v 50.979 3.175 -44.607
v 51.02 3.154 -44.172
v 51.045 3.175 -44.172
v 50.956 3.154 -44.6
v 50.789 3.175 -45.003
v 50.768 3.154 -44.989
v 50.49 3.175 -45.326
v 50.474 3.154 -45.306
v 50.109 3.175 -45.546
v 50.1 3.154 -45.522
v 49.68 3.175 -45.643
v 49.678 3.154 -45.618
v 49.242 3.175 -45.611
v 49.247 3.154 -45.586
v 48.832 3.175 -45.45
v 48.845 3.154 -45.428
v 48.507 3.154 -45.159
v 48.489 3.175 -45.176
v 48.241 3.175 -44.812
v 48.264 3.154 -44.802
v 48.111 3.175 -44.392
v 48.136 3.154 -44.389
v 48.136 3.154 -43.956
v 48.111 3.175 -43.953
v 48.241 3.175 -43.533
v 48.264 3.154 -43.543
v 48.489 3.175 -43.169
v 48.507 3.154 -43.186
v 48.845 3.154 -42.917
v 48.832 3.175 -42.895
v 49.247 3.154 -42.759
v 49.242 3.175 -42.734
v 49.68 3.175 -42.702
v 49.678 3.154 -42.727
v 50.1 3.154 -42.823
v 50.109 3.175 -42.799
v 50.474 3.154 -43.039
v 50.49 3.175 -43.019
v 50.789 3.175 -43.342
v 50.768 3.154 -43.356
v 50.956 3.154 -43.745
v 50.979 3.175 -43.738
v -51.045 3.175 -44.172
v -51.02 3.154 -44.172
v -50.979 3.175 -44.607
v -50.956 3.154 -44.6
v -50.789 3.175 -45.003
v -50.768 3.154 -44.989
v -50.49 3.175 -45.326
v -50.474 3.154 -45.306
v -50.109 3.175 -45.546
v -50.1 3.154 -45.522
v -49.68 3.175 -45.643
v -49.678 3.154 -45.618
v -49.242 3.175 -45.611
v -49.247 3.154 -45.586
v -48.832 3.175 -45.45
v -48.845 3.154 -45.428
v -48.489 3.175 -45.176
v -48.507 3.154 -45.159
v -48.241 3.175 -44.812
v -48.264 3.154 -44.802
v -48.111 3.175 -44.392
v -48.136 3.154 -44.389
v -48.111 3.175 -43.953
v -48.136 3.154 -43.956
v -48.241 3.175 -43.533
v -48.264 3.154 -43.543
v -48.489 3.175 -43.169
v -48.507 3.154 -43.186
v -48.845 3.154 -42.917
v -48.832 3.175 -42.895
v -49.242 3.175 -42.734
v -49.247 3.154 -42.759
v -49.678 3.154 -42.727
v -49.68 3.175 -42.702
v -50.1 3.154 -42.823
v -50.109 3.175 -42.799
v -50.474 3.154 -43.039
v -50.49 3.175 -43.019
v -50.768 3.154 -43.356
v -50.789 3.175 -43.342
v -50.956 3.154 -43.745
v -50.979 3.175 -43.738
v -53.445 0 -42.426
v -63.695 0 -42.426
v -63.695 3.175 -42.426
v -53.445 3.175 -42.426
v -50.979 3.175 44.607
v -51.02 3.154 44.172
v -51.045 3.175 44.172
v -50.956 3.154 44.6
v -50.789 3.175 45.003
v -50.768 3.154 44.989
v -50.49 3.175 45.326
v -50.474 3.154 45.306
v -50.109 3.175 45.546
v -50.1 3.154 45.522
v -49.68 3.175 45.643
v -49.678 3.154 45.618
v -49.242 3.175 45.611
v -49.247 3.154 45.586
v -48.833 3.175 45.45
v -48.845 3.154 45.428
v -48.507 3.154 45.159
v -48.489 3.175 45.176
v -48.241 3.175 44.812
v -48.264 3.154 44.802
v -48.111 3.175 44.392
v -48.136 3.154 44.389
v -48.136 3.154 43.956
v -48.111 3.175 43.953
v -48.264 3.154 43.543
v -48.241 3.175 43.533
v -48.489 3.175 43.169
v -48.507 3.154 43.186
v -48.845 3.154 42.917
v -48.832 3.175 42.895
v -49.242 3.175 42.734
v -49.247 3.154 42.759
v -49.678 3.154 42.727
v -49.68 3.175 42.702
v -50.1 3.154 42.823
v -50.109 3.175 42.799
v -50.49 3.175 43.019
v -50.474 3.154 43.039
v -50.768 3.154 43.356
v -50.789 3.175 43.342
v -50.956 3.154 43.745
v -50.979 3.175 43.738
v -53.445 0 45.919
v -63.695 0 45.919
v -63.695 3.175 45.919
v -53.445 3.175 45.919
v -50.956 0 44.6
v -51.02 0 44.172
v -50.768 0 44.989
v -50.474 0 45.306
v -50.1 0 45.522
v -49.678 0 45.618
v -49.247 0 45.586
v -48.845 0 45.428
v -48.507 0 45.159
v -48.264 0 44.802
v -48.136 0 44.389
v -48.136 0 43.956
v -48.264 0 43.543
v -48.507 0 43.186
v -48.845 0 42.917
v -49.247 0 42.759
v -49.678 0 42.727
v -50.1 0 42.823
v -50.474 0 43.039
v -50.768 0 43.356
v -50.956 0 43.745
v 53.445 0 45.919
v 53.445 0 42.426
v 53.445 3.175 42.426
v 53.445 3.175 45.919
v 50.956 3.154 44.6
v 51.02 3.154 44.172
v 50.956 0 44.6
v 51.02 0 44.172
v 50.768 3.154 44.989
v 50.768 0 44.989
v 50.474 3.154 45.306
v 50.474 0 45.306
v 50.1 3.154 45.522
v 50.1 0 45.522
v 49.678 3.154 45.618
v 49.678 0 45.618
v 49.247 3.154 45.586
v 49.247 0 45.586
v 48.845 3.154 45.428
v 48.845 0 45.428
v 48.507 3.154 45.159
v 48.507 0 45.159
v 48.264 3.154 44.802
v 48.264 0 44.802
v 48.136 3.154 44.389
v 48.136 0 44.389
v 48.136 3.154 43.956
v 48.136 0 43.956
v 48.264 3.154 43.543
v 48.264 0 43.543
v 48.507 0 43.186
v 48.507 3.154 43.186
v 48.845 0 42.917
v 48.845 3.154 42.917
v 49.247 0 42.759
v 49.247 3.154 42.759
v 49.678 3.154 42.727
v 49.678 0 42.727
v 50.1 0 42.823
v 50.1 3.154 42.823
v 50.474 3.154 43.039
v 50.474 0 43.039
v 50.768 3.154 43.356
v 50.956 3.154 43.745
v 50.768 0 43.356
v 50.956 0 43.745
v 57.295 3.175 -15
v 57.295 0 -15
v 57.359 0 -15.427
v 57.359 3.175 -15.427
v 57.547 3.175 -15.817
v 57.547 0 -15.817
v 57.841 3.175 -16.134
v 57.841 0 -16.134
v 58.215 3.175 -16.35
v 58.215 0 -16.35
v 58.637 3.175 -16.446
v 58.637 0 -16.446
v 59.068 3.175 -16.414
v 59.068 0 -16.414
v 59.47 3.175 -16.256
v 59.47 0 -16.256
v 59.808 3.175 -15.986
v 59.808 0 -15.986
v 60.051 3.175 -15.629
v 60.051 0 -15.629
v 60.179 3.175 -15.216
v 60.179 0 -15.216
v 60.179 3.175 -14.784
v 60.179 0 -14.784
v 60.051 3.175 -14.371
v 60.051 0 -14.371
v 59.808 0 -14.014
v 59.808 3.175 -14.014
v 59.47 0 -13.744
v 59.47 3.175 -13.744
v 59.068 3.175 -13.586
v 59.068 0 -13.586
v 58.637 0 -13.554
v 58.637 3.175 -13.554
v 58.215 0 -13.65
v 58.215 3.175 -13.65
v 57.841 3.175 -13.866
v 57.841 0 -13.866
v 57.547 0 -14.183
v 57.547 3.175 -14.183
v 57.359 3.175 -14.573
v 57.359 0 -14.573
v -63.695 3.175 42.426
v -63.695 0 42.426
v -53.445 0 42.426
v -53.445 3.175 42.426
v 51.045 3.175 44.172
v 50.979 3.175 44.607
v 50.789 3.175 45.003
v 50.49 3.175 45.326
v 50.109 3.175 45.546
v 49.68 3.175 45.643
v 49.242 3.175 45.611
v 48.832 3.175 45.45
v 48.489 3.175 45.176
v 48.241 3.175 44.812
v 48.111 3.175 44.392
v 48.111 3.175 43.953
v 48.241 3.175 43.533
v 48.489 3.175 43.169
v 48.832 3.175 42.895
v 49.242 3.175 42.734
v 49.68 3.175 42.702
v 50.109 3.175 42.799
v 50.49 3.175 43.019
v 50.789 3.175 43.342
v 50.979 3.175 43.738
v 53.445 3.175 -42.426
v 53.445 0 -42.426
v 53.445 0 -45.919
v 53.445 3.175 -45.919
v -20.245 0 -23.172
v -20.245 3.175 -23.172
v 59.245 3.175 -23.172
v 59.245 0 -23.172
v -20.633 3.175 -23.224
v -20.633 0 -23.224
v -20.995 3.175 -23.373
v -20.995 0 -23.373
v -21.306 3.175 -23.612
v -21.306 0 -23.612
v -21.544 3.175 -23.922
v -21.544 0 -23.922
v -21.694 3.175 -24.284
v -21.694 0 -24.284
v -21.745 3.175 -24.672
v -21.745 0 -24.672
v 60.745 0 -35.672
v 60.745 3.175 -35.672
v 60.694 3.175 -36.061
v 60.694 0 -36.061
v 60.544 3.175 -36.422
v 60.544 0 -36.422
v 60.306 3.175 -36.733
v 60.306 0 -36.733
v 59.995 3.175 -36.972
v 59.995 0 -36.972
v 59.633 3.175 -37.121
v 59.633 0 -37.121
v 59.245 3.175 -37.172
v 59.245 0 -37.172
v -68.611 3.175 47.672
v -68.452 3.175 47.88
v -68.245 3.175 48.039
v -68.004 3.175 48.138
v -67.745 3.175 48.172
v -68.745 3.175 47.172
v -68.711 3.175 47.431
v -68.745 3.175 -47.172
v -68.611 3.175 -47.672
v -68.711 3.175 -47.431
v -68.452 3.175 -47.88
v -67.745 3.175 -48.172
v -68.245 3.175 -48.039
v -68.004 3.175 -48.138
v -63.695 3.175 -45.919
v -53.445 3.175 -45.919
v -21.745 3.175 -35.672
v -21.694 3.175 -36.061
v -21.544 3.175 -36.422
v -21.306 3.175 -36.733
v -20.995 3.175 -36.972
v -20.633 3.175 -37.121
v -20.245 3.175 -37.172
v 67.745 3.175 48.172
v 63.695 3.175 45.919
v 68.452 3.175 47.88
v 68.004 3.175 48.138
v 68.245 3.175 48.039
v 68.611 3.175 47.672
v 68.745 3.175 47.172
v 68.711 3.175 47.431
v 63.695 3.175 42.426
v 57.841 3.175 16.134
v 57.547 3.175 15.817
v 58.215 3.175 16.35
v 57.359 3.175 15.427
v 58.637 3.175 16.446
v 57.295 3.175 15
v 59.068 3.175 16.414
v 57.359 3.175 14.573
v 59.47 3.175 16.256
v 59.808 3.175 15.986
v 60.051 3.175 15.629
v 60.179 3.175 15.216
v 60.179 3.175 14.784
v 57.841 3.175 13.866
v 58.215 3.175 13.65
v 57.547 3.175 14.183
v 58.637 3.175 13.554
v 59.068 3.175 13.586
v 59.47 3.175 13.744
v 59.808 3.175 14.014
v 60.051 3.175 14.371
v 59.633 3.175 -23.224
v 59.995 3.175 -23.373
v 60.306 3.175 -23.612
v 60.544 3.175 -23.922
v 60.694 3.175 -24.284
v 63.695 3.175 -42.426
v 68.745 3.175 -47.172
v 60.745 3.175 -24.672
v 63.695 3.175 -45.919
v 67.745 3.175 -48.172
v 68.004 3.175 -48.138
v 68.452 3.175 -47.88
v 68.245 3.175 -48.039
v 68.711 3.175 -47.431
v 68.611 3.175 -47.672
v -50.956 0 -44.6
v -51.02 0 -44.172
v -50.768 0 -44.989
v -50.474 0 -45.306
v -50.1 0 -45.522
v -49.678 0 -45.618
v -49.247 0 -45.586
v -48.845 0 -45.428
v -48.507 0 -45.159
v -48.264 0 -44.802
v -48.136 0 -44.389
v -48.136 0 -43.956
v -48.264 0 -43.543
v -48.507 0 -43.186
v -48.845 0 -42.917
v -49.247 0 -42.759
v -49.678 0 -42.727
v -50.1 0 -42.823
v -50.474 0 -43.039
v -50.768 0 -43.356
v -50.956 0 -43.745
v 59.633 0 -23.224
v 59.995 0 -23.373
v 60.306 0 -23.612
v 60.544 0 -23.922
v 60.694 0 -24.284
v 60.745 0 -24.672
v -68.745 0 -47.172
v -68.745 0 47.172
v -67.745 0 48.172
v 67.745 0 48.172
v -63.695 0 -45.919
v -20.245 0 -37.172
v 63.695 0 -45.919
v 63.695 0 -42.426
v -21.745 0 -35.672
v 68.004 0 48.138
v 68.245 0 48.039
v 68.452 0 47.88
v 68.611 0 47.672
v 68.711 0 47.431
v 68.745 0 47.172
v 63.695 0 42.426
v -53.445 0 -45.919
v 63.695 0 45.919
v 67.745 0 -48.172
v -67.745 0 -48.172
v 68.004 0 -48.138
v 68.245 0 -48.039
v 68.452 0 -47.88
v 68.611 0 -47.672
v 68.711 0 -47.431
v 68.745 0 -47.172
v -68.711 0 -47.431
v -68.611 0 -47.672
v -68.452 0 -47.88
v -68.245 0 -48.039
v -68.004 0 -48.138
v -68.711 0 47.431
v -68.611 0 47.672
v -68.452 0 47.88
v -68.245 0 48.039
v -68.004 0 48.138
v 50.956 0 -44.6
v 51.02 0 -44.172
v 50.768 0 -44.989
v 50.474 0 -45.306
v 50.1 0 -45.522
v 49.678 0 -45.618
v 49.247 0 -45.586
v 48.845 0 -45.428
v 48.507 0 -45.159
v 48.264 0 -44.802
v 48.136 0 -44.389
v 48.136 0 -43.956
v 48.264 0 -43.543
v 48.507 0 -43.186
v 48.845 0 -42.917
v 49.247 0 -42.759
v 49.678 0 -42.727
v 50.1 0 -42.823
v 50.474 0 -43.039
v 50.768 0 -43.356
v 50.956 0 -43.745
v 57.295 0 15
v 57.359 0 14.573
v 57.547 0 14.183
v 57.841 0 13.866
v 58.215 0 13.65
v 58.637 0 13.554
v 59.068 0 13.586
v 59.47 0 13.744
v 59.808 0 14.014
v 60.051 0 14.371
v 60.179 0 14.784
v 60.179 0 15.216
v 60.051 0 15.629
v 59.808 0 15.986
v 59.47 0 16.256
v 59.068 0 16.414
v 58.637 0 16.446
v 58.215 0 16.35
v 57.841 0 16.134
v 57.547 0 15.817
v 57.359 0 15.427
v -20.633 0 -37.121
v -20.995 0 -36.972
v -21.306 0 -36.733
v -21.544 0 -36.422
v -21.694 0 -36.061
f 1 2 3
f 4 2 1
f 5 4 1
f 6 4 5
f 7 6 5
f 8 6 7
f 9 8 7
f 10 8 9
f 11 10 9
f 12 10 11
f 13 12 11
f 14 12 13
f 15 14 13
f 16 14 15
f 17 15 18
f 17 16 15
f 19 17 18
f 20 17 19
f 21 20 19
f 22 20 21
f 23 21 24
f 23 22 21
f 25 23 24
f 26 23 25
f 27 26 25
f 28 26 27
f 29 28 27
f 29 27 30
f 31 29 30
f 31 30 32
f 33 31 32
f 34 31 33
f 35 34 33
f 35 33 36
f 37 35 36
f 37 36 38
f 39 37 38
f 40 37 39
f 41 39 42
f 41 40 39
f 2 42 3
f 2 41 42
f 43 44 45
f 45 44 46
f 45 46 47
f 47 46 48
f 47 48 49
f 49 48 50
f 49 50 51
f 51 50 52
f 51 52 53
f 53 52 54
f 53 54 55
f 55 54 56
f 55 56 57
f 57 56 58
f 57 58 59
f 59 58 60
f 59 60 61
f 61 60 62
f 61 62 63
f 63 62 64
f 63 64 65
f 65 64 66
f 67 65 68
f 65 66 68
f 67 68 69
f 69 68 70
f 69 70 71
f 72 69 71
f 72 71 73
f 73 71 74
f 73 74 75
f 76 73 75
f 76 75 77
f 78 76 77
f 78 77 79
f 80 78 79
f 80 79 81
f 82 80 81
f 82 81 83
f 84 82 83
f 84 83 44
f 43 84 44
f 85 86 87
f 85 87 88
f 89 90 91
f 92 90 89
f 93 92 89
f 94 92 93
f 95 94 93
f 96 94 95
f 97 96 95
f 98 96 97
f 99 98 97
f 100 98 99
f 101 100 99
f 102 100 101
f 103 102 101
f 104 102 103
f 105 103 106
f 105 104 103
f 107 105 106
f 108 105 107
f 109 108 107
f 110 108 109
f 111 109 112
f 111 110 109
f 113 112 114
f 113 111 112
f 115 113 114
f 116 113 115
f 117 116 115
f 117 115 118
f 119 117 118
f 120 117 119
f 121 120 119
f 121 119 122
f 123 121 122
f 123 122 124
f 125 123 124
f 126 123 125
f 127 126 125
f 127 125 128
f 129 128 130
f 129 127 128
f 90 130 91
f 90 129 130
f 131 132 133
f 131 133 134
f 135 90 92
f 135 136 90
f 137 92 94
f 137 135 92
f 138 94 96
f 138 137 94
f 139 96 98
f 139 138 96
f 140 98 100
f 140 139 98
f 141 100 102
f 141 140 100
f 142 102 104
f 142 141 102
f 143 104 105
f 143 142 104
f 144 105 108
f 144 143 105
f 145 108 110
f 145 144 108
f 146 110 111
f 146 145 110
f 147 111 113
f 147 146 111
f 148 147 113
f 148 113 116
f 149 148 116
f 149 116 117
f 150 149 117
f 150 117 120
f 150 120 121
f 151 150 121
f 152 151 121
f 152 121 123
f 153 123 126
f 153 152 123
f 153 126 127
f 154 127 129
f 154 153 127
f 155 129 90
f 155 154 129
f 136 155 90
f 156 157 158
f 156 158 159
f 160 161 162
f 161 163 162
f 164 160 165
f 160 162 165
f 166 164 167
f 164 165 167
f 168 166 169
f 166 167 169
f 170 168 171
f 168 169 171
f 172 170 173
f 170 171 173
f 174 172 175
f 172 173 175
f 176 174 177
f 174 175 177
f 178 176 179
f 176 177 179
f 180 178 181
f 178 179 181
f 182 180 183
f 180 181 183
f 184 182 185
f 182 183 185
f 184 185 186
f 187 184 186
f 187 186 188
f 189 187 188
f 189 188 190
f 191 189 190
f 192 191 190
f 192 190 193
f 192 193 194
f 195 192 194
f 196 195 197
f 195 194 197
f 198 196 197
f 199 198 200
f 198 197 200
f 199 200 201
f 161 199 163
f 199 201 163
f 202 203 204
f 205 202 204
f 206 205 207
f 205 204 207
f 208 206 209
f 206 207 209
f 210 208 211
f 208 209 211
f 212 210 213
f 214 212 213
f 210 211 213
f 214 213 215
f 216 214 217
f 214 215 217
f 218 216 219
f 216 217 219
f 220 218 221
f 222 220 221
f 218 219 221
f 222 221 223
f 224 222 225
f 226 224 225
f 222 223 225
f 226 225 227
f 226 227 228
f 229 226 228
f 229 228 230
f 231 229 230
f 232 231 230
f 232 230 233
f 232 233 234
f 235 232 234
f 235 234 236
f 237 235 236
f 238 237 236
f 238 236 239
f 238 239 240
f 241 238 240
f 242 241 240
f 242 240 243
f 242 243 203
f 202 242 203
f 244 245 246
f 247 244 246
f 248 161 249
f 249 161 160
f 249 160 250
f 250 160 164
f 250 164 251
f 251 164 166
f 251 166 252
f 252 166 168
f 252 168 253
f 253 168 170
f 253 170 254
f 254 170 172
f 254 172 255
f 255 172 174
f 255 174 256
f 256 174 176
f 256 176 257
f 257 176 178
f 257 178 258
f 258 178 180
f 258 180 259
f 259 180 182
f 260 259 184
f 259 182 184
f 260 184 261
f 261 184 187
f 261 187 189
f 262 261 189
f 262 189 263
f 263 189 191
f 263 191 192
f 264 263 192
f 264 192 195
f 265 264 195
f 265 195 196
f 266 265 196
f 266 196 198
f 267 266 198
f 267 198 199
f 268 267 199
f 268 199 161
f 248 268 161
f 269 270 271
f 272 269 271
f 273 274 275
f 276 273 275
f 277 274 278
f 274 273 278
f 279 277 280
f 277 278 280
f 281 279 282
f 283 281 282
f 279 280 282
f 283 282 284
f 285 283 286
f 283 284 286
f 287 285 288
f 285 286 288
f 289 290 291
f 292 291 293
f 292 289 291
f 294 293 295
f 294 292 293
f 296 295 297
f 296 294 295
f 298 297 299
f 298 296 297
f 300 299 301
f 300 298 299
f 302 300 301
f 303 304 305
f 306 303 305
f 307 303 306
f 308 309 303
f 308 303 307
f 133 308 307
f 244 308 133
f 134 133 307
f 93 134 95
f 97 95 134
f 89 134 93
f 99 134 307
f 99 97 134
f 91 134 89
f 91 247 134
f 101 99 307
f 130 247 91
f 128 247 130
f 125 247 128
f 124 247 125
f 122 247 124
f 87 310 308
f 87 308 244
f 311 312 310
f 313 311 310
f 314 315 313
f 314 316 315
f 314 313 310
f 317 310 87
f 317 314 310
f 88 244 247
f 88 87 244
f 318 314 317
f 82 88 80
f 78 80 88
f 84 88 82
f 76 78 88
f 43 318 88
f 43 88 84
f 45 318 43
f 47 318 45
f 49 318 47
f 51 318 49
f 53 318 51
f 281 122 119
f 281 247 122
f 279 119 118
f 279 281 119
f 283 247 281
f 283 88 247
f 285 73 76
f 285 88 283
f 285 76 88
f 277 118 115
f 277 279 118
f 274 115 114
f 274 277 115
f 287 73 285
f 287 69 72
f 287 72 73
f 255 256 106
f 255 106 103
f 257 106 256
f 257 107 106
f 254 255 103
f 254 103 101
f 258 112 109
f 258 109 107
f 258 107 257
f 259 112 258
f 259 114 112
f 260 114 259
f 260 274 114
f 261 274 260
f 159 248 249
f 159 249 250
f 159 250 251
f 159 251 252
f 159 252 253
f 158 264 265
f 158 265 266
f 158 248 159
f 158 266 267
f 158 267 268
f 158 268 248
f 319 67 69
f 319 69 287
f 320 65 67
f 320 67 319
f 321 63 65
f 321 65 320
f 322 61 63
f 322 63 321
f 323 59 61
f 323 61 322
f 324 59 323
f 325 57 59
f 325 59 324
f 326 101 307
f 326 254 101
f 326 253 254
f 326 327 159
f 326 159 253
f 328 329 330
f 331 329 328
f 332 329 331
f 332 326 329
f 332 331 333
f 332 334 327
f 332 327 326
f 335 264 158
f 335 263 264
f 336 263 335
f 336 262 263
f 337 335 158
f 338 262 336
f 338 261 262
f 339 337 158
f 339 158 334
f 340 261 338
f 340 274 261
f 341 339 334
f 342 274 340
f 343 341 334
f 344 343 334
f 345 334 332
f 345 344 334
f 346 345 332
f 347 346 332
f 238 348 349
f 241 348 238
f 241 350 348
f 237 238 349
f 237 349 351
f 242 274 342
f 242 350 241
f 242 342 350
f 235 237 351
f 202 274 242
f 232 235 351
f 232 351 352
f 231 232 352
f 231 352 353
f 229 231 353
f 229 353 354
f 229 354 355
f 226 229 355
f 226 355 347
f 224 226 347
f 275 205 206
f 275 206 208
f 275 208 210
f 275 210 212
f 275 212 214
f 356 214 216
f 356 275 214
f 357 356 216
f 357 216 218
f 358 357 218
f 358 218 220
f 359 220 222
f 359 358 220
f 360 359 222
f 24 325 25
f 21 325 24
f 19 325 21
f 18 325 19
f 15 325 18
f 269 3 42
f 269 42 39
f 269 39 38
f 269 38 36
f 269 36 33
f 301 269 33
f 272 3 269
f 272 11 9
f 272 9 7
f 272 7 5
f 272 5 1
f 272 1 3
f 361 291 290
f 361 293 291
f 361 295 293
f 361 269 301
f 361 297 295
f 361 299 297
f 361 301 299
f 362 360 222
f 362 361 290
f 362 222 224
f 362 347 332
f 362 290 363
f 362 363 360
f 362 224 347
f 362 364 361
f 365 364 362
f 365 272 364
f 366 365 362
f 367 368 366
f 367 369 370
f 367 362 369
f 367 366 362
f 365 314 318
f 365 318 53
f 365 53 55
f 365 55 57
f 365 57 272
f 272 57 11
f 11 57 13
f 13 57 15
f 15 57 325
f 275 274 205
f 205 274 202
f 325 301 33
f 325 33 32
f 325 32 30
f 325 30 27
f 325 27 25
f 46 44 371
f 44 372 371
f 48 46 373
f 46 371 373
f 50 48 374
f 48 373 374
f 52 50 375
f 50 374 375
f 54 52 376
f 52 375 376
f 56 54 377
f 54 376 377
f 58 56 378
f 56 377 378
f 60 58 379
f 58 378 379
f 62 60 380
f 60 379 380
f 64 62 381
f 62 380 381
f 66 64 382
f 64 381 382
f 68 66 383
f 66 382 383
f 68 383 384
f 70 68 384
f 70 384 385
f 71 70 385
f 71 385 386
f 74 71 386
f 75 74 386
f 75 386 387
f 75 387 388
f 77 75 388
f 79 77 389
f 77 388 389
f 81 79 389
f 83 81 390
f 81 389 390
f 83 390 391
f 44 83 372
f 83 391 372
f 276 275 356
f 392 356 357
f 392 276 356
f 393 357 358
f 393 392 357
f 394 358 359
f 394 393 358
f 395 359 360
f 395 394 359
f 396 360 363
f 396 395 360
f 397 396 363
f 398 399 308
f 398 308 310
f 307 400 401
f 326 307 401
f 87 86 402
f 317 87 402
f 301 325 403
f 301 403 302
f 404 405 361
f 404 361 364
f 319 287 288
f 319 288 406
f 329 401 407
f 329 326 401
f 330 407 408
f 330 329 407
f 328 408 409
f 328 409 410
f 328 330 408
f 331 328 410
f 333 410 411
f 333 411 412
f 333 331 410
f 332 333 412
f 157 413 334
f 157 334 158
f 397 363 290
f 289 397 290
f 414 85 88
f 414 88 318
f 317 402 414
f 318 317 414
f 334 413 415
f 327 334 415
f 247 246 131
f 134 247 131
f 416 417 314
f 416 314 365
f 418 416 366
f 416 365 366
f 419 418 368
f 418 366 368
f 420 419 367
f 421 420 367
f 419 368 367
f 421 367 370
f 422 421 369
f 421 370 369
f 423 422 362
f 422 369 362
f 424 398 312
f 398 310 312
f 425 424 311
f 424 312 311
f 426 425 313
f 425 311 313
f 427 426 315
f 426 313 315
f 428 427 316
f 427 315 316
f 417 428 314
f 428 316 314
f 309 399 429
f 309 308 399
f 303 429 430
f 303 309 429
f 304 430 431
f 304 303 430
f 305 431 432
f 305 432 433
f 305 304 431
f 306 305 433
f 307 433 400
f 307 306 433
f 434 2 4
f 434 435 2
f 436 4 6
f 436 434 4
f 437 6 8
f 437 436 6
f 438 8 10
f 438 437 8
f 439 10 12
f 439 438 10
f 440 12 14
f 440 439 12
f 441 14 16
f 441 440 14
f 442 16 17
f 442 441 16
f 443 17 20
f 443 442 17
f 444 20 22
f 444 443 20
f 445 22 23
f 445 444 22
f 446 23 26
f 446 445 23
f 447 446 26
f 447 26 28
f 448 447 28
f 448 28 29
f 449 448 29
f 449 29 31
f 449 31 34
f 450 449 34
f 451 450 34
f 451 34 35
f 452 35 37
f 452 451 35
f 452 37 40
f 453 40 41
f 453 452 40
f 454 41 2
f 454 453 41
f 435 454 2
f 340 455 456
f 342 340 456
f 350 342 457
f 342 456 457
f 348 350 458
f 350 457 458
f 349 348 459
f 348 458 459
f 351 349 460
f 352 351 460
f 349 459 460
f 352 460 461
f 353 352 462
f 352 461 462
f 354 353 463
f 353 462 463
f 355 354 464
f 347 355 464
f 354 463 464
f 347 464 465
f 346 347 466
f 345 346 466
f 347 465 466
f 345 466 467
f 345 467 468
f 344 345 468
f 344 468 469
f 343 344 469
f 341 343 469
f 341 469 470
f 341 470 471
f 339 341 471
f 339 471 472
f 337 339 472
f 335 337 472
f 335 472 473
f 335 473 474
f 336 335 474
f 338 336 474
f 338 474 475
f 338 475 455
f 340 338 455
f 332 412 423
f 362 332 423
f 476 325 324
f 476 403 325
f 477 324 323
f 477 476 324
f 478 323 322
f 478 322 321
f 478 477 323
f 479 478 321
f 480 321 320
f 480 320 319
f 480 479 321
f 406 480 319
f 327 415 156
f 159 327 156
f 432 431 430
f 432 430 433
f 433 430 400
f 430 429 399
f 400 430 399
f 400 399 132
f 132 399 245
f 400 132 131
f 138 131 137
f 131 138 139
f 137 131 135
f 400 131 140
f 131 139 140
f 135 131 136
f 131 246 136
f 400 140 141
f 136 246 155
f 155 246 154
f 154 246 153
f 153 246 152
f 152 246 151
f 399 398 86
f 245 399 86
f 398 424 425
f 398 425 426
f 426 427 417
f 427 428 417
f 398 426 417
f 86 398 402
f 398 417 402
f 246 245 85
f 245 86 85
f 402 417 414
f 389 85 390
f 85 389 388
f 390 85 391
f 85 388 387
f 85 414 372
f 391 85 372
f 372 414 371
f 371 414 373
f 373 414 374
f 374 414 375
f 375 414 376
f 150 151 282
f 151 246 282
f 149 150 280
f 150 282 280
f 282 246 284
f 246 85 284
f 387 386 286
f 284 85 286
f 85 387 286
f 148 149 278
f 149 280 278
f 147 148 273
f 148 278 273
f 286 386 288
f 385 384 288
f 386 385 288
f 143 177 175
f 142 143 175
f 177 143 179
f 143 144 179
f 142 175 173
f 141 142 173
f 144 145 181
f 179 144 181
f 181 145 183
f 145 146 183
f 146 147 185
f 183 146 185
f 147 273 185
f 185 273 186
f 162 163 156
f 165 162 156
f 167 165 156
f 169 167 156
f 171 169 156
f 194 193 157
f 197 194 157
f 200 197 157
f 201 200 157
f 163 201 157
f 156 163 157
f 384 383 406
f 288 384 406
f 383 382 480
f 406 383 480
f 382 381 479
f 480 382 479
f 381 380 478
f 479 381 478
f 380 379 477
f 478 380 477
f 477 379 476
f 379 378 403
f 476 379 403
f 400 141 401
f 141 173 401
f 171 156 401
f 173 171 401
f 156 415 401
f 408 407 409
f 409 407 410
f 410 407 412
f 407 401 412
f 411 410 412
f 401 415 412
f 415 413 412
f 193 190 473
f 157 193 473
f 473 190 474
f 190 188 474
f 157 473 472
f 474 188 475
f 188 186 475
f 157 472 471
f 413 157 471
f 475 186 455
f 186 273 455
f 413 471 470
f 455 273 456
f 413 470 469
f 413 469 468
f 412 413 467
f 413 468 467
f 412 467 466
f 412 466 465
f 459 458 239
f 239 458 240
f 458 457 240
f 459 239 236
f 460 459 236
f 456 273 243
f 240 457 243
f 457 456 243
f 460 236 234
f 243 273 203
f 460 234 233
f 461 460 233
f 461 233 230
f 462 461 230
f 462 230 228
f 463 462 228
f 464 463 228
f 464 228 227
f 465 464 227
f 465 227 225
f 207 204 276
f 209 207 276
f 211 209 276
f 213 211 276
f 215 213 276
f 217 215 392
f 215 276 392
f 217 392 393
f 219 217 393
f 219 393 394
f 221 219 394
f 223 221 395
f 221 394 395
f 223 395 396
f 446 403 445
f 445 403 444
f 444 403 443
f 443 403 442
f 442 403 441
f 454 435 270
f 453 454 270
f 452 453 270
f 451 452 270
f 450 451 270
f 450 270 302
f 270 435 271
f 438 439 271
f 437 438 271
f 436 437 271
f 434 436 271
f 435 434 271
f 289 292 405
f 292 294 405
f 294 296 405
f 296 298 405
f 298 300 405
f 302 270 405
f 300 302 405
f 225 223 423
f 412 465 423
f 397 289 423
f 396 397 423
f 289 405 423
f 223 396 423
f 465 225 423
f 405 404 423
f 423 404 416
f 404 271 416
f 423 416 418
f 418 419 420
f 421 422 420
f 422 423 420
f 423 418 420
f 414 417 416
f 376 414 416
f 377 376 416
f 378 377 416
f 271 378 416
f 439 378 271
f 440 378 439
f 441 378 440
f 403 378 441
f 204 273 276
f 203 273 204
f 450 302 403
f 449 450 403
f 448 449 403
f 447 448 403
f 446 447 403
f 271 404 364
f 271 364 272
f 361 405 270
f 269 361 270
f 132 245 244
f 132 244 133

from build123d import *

# Parameters (mm, degrees)
SKETCH1_W                                      = 137.49
SKETCH1_H                                      = 96.345
SKETCH1_R                                      = 2.5
SKETCH1_W_2                                    = 10.25
SKETCH1_H_2                                    = 3.4925
BOSS_EXTRUDE1_DEPTH                            = 3.175
CUT_EXTRUDE1_START                             = -1
SKETCH1_3_W                                    = 10.25
SKETCH1_3_H                                    = 3.4925
CUT_EXTRUDE1_DEPTH                             = 5.175
M2_5_CLEARANCE_HOLE1_D                         = 2.9
M2_5_CLEARANCE_HOLE1_CSINK_D                   = 2.95
M2_5_CLEARANCE_HOLE1_CSINK_ANGLE               = 100
MIRROR1_START                                  = -1
MIRROR1_AT_THE_SECOND_PLANE_COPY_1_SKETC_W     = 10.25
MIRROR1_AT_THE_SECOND_PLANE_COPY_1_SKETC_H     = 3.4925
MIRROR1_AT_THE_SECOND_PLANE_COPY_1_DEPTH       = 5.175
MIRROR1_AT_THE_SECOND_PLANE_COPY_2_D           = 2.9
MIRROR1_AT_THE_SECOND_PLANE_COPY_2_CSINK_D     = 2.95
MIRROR1_AT_THE_SECOND_PLANE_COPY_2_CSINK_ANGLE = 100
SKETCH4_W                                      = 82.49
SKETCH4_H                                      = 14
CUT_EXTRUDE2_DEPTH                             = 1
CUT_EXTRUDE2_DEPTH_BACK                        = 4.175
FILLET1_R                                      = 1.5
FILLET2_R                                      = 1
M2_5_CLEARANCE_HOLE2_D                         = 2.9


with BuildPart() as part:
    # Sketch1 → Boss-Extrude1 (new body)
    with BuildSketch(Plane(origin=(0, 0, 0), x_dir=(1, 0, 0), z_dir=(0, 1, 0))):
        Rectangle(SKETCH1_W, SKETCH1_H)
        with Locations((-49.57, 44.1725)):
            Circle(SKETCH1_R, mode=Mode.SUBTRACT)
        with Locations((-58.57, 44.1725)):
            Rectangle(SKETCH1_W_2, SKETCH1_H_2, mode=Mode.SUBTRACT)
        with Locations((-58.57, 44.1725)):
            Rectangle(SKETCH1_W_2, SKETCH1_H_2)
        with Locations((-49.57, 44.1725)):
            Circle(SKETCH1_R)
    extrude(amount=BOSS_EXTRUDE1_DEPTH)

    # Sketch1<3> → Cut-Extrude1 (cut)
    with BuildSketch(Plane(origin=(0, 0, 0), x_dir=(1, 0, 0), z_dir=(0, 1, 0)).offset(CUT_EXTRUDE1_START)):
        with Locations((-58.57, 44.1725)):
            Rectangle(SKETCH1_3_W, SKETCH1_3_H)
    cut_extrude1 = extrude(amount=CUT_EXTRUDE1_DEPTH, mode=Mode.SUBTRACT)

    # M2.5 Clearance Hole1 (through all)
    with Locations(Plane(origin=(0, 3.175, 0), x_dir=(1, 0, 0), z_dir=(0, 1, 0))):
        with Locations((-49.57, 44.1725)):
            m2_5_clearance_hole1 = CounterSinkHole(M2_5_CLEARANCE_HOLE1_D / 2, M2_5_CLEARANCE_HOLE1_CSINK_D / 2, counter_sink_angle=M2_5_CLEARANCE_HOLE1_CSINK_ANGLE)

    # Mirror1: Cut-Extrude1, M2.5 Clearance Hole1 across plane
    add(cut_extrude1.mirror(Plane(origin=(0, 0, 0), x_dir=(0, 0, 1), z_dir=(1, 0, 0))), mode=Mode.SUBTRACT)
    add(m2_5_clearance_hole1.mirror(Plane(origin=(0, 0, 0), x_dir=(0, 0, 1), z_dir=(1, 0, 0))), mode=Mode.SUBTRACT)

    # Mirror1 at the second plane: M2.5 Clearance Hole1, Cut-Extrude1 across plane
    add(m2_5_clearance_hole1.mirror(Plane.XY), mode=Mode.SUBTRACT)
    add(cut_extrude1.mirror(Plane.XY), mode=Mode.SUBTRACT)

    # Mirror1 at the second plane copy 1 sketc → Mirror1 at the second plane copy 1 (cut)
    with BuildSketch(Plane(origin=(0, 0, 0), x_dir=(-1, 0, 0), z_dir=(0, 1, 0)).offset(MIRROR1_START)):
        with Locations((-58.57, 44.1725)):
            Rectangle(MIRROR1_AT_THE_SECOND_PLANE_COPY_1_SKETC_W, MIRROR1_AT_THE_SECOND_PLANE_COPY_1_SKETC_H)
    extrude(amount=MIRROR1_AT_THE_SECOND_PLANE_COPY_1_DEPTH, mode=Mode.SUBTRACT)

    # Mirror1 at the second plane copy 2 (through all)
    with Locations(Plane(origin=(0, 3.175, 0), x_dir=(-1, 0, 0), z_dir=(0, 1, 0))):
        with Locations((-49.57, 44.1725)):
            CounterSinkHole(MIRROR1_AT_THE_SECOND_PLANE_COPY_2_D / 2, MIRROR1_AT_THE_SECOND_PLANE_COPY_2_CSINK_D / 2, counter_sink_angle=MIRROR1_AT_THE_SECOND_PLANE_COPY_2_CSINK_ANGLE)

    # Sketch4 → Cut-Extrude2 (cut, two sides)
    with BuildSketch(Plane(origin=(0, 3.175, 0), x_dir=(1, 0, 0), z_dir=(0, 1, 0))) as cut_extrude2_sk:
        with Locations((19.5, 30.1725)):
            Rectangle(SKETCH4_W, SKETCH4_H)
    extrude(amount=CUT_EXTRUDE2_DEPTH, mode=Mode.SUBTRACT)
    extrude(cut_extrude2_sk.sketch, amount=-CUT_EXTRUDE2_DEPTH_BACK, mode=Mode.SUBTRACT)

    # Fillet1
    fillet1_edges = [part.edges().sort_by_distance(p)[0] for p in [
        (-21.745, 1.5875, -23.1725),
        (-21.745, 1.5875, -37.1725),
        (60.745, 1.5875, -37.1725),
        (60.745, 1.5875, -23.1725),
    ]]
    fillet(fillet1_edges, radius=FILLET1_R)

    # Fillet2
    fillet2_edges = [part.edges().sort_by_distance(p)[0] for p in [
        (-68.745, 1.5875, 48.1725),
        (-68.745, 1.5875, -48.1725),
        (68.745, 1.5875, -48.1725),
        (68.745, 1.5875, 48.1725),
    ]]
    fillet(fillet2_edges, radius=FILLET2_R)

    # M2.5 Clearance Hole2 (through all)
    with Locations(Plane(origin=(0, 3.175, 0), x_dir=(1, 0, 0), z_dir=(0, 1, 0))):
        with Locations((58.745, 15), (58.745, -15)):
            Hole(M2_5_CLEARANCE_HOLE2_D / 2)


solid = part.part
